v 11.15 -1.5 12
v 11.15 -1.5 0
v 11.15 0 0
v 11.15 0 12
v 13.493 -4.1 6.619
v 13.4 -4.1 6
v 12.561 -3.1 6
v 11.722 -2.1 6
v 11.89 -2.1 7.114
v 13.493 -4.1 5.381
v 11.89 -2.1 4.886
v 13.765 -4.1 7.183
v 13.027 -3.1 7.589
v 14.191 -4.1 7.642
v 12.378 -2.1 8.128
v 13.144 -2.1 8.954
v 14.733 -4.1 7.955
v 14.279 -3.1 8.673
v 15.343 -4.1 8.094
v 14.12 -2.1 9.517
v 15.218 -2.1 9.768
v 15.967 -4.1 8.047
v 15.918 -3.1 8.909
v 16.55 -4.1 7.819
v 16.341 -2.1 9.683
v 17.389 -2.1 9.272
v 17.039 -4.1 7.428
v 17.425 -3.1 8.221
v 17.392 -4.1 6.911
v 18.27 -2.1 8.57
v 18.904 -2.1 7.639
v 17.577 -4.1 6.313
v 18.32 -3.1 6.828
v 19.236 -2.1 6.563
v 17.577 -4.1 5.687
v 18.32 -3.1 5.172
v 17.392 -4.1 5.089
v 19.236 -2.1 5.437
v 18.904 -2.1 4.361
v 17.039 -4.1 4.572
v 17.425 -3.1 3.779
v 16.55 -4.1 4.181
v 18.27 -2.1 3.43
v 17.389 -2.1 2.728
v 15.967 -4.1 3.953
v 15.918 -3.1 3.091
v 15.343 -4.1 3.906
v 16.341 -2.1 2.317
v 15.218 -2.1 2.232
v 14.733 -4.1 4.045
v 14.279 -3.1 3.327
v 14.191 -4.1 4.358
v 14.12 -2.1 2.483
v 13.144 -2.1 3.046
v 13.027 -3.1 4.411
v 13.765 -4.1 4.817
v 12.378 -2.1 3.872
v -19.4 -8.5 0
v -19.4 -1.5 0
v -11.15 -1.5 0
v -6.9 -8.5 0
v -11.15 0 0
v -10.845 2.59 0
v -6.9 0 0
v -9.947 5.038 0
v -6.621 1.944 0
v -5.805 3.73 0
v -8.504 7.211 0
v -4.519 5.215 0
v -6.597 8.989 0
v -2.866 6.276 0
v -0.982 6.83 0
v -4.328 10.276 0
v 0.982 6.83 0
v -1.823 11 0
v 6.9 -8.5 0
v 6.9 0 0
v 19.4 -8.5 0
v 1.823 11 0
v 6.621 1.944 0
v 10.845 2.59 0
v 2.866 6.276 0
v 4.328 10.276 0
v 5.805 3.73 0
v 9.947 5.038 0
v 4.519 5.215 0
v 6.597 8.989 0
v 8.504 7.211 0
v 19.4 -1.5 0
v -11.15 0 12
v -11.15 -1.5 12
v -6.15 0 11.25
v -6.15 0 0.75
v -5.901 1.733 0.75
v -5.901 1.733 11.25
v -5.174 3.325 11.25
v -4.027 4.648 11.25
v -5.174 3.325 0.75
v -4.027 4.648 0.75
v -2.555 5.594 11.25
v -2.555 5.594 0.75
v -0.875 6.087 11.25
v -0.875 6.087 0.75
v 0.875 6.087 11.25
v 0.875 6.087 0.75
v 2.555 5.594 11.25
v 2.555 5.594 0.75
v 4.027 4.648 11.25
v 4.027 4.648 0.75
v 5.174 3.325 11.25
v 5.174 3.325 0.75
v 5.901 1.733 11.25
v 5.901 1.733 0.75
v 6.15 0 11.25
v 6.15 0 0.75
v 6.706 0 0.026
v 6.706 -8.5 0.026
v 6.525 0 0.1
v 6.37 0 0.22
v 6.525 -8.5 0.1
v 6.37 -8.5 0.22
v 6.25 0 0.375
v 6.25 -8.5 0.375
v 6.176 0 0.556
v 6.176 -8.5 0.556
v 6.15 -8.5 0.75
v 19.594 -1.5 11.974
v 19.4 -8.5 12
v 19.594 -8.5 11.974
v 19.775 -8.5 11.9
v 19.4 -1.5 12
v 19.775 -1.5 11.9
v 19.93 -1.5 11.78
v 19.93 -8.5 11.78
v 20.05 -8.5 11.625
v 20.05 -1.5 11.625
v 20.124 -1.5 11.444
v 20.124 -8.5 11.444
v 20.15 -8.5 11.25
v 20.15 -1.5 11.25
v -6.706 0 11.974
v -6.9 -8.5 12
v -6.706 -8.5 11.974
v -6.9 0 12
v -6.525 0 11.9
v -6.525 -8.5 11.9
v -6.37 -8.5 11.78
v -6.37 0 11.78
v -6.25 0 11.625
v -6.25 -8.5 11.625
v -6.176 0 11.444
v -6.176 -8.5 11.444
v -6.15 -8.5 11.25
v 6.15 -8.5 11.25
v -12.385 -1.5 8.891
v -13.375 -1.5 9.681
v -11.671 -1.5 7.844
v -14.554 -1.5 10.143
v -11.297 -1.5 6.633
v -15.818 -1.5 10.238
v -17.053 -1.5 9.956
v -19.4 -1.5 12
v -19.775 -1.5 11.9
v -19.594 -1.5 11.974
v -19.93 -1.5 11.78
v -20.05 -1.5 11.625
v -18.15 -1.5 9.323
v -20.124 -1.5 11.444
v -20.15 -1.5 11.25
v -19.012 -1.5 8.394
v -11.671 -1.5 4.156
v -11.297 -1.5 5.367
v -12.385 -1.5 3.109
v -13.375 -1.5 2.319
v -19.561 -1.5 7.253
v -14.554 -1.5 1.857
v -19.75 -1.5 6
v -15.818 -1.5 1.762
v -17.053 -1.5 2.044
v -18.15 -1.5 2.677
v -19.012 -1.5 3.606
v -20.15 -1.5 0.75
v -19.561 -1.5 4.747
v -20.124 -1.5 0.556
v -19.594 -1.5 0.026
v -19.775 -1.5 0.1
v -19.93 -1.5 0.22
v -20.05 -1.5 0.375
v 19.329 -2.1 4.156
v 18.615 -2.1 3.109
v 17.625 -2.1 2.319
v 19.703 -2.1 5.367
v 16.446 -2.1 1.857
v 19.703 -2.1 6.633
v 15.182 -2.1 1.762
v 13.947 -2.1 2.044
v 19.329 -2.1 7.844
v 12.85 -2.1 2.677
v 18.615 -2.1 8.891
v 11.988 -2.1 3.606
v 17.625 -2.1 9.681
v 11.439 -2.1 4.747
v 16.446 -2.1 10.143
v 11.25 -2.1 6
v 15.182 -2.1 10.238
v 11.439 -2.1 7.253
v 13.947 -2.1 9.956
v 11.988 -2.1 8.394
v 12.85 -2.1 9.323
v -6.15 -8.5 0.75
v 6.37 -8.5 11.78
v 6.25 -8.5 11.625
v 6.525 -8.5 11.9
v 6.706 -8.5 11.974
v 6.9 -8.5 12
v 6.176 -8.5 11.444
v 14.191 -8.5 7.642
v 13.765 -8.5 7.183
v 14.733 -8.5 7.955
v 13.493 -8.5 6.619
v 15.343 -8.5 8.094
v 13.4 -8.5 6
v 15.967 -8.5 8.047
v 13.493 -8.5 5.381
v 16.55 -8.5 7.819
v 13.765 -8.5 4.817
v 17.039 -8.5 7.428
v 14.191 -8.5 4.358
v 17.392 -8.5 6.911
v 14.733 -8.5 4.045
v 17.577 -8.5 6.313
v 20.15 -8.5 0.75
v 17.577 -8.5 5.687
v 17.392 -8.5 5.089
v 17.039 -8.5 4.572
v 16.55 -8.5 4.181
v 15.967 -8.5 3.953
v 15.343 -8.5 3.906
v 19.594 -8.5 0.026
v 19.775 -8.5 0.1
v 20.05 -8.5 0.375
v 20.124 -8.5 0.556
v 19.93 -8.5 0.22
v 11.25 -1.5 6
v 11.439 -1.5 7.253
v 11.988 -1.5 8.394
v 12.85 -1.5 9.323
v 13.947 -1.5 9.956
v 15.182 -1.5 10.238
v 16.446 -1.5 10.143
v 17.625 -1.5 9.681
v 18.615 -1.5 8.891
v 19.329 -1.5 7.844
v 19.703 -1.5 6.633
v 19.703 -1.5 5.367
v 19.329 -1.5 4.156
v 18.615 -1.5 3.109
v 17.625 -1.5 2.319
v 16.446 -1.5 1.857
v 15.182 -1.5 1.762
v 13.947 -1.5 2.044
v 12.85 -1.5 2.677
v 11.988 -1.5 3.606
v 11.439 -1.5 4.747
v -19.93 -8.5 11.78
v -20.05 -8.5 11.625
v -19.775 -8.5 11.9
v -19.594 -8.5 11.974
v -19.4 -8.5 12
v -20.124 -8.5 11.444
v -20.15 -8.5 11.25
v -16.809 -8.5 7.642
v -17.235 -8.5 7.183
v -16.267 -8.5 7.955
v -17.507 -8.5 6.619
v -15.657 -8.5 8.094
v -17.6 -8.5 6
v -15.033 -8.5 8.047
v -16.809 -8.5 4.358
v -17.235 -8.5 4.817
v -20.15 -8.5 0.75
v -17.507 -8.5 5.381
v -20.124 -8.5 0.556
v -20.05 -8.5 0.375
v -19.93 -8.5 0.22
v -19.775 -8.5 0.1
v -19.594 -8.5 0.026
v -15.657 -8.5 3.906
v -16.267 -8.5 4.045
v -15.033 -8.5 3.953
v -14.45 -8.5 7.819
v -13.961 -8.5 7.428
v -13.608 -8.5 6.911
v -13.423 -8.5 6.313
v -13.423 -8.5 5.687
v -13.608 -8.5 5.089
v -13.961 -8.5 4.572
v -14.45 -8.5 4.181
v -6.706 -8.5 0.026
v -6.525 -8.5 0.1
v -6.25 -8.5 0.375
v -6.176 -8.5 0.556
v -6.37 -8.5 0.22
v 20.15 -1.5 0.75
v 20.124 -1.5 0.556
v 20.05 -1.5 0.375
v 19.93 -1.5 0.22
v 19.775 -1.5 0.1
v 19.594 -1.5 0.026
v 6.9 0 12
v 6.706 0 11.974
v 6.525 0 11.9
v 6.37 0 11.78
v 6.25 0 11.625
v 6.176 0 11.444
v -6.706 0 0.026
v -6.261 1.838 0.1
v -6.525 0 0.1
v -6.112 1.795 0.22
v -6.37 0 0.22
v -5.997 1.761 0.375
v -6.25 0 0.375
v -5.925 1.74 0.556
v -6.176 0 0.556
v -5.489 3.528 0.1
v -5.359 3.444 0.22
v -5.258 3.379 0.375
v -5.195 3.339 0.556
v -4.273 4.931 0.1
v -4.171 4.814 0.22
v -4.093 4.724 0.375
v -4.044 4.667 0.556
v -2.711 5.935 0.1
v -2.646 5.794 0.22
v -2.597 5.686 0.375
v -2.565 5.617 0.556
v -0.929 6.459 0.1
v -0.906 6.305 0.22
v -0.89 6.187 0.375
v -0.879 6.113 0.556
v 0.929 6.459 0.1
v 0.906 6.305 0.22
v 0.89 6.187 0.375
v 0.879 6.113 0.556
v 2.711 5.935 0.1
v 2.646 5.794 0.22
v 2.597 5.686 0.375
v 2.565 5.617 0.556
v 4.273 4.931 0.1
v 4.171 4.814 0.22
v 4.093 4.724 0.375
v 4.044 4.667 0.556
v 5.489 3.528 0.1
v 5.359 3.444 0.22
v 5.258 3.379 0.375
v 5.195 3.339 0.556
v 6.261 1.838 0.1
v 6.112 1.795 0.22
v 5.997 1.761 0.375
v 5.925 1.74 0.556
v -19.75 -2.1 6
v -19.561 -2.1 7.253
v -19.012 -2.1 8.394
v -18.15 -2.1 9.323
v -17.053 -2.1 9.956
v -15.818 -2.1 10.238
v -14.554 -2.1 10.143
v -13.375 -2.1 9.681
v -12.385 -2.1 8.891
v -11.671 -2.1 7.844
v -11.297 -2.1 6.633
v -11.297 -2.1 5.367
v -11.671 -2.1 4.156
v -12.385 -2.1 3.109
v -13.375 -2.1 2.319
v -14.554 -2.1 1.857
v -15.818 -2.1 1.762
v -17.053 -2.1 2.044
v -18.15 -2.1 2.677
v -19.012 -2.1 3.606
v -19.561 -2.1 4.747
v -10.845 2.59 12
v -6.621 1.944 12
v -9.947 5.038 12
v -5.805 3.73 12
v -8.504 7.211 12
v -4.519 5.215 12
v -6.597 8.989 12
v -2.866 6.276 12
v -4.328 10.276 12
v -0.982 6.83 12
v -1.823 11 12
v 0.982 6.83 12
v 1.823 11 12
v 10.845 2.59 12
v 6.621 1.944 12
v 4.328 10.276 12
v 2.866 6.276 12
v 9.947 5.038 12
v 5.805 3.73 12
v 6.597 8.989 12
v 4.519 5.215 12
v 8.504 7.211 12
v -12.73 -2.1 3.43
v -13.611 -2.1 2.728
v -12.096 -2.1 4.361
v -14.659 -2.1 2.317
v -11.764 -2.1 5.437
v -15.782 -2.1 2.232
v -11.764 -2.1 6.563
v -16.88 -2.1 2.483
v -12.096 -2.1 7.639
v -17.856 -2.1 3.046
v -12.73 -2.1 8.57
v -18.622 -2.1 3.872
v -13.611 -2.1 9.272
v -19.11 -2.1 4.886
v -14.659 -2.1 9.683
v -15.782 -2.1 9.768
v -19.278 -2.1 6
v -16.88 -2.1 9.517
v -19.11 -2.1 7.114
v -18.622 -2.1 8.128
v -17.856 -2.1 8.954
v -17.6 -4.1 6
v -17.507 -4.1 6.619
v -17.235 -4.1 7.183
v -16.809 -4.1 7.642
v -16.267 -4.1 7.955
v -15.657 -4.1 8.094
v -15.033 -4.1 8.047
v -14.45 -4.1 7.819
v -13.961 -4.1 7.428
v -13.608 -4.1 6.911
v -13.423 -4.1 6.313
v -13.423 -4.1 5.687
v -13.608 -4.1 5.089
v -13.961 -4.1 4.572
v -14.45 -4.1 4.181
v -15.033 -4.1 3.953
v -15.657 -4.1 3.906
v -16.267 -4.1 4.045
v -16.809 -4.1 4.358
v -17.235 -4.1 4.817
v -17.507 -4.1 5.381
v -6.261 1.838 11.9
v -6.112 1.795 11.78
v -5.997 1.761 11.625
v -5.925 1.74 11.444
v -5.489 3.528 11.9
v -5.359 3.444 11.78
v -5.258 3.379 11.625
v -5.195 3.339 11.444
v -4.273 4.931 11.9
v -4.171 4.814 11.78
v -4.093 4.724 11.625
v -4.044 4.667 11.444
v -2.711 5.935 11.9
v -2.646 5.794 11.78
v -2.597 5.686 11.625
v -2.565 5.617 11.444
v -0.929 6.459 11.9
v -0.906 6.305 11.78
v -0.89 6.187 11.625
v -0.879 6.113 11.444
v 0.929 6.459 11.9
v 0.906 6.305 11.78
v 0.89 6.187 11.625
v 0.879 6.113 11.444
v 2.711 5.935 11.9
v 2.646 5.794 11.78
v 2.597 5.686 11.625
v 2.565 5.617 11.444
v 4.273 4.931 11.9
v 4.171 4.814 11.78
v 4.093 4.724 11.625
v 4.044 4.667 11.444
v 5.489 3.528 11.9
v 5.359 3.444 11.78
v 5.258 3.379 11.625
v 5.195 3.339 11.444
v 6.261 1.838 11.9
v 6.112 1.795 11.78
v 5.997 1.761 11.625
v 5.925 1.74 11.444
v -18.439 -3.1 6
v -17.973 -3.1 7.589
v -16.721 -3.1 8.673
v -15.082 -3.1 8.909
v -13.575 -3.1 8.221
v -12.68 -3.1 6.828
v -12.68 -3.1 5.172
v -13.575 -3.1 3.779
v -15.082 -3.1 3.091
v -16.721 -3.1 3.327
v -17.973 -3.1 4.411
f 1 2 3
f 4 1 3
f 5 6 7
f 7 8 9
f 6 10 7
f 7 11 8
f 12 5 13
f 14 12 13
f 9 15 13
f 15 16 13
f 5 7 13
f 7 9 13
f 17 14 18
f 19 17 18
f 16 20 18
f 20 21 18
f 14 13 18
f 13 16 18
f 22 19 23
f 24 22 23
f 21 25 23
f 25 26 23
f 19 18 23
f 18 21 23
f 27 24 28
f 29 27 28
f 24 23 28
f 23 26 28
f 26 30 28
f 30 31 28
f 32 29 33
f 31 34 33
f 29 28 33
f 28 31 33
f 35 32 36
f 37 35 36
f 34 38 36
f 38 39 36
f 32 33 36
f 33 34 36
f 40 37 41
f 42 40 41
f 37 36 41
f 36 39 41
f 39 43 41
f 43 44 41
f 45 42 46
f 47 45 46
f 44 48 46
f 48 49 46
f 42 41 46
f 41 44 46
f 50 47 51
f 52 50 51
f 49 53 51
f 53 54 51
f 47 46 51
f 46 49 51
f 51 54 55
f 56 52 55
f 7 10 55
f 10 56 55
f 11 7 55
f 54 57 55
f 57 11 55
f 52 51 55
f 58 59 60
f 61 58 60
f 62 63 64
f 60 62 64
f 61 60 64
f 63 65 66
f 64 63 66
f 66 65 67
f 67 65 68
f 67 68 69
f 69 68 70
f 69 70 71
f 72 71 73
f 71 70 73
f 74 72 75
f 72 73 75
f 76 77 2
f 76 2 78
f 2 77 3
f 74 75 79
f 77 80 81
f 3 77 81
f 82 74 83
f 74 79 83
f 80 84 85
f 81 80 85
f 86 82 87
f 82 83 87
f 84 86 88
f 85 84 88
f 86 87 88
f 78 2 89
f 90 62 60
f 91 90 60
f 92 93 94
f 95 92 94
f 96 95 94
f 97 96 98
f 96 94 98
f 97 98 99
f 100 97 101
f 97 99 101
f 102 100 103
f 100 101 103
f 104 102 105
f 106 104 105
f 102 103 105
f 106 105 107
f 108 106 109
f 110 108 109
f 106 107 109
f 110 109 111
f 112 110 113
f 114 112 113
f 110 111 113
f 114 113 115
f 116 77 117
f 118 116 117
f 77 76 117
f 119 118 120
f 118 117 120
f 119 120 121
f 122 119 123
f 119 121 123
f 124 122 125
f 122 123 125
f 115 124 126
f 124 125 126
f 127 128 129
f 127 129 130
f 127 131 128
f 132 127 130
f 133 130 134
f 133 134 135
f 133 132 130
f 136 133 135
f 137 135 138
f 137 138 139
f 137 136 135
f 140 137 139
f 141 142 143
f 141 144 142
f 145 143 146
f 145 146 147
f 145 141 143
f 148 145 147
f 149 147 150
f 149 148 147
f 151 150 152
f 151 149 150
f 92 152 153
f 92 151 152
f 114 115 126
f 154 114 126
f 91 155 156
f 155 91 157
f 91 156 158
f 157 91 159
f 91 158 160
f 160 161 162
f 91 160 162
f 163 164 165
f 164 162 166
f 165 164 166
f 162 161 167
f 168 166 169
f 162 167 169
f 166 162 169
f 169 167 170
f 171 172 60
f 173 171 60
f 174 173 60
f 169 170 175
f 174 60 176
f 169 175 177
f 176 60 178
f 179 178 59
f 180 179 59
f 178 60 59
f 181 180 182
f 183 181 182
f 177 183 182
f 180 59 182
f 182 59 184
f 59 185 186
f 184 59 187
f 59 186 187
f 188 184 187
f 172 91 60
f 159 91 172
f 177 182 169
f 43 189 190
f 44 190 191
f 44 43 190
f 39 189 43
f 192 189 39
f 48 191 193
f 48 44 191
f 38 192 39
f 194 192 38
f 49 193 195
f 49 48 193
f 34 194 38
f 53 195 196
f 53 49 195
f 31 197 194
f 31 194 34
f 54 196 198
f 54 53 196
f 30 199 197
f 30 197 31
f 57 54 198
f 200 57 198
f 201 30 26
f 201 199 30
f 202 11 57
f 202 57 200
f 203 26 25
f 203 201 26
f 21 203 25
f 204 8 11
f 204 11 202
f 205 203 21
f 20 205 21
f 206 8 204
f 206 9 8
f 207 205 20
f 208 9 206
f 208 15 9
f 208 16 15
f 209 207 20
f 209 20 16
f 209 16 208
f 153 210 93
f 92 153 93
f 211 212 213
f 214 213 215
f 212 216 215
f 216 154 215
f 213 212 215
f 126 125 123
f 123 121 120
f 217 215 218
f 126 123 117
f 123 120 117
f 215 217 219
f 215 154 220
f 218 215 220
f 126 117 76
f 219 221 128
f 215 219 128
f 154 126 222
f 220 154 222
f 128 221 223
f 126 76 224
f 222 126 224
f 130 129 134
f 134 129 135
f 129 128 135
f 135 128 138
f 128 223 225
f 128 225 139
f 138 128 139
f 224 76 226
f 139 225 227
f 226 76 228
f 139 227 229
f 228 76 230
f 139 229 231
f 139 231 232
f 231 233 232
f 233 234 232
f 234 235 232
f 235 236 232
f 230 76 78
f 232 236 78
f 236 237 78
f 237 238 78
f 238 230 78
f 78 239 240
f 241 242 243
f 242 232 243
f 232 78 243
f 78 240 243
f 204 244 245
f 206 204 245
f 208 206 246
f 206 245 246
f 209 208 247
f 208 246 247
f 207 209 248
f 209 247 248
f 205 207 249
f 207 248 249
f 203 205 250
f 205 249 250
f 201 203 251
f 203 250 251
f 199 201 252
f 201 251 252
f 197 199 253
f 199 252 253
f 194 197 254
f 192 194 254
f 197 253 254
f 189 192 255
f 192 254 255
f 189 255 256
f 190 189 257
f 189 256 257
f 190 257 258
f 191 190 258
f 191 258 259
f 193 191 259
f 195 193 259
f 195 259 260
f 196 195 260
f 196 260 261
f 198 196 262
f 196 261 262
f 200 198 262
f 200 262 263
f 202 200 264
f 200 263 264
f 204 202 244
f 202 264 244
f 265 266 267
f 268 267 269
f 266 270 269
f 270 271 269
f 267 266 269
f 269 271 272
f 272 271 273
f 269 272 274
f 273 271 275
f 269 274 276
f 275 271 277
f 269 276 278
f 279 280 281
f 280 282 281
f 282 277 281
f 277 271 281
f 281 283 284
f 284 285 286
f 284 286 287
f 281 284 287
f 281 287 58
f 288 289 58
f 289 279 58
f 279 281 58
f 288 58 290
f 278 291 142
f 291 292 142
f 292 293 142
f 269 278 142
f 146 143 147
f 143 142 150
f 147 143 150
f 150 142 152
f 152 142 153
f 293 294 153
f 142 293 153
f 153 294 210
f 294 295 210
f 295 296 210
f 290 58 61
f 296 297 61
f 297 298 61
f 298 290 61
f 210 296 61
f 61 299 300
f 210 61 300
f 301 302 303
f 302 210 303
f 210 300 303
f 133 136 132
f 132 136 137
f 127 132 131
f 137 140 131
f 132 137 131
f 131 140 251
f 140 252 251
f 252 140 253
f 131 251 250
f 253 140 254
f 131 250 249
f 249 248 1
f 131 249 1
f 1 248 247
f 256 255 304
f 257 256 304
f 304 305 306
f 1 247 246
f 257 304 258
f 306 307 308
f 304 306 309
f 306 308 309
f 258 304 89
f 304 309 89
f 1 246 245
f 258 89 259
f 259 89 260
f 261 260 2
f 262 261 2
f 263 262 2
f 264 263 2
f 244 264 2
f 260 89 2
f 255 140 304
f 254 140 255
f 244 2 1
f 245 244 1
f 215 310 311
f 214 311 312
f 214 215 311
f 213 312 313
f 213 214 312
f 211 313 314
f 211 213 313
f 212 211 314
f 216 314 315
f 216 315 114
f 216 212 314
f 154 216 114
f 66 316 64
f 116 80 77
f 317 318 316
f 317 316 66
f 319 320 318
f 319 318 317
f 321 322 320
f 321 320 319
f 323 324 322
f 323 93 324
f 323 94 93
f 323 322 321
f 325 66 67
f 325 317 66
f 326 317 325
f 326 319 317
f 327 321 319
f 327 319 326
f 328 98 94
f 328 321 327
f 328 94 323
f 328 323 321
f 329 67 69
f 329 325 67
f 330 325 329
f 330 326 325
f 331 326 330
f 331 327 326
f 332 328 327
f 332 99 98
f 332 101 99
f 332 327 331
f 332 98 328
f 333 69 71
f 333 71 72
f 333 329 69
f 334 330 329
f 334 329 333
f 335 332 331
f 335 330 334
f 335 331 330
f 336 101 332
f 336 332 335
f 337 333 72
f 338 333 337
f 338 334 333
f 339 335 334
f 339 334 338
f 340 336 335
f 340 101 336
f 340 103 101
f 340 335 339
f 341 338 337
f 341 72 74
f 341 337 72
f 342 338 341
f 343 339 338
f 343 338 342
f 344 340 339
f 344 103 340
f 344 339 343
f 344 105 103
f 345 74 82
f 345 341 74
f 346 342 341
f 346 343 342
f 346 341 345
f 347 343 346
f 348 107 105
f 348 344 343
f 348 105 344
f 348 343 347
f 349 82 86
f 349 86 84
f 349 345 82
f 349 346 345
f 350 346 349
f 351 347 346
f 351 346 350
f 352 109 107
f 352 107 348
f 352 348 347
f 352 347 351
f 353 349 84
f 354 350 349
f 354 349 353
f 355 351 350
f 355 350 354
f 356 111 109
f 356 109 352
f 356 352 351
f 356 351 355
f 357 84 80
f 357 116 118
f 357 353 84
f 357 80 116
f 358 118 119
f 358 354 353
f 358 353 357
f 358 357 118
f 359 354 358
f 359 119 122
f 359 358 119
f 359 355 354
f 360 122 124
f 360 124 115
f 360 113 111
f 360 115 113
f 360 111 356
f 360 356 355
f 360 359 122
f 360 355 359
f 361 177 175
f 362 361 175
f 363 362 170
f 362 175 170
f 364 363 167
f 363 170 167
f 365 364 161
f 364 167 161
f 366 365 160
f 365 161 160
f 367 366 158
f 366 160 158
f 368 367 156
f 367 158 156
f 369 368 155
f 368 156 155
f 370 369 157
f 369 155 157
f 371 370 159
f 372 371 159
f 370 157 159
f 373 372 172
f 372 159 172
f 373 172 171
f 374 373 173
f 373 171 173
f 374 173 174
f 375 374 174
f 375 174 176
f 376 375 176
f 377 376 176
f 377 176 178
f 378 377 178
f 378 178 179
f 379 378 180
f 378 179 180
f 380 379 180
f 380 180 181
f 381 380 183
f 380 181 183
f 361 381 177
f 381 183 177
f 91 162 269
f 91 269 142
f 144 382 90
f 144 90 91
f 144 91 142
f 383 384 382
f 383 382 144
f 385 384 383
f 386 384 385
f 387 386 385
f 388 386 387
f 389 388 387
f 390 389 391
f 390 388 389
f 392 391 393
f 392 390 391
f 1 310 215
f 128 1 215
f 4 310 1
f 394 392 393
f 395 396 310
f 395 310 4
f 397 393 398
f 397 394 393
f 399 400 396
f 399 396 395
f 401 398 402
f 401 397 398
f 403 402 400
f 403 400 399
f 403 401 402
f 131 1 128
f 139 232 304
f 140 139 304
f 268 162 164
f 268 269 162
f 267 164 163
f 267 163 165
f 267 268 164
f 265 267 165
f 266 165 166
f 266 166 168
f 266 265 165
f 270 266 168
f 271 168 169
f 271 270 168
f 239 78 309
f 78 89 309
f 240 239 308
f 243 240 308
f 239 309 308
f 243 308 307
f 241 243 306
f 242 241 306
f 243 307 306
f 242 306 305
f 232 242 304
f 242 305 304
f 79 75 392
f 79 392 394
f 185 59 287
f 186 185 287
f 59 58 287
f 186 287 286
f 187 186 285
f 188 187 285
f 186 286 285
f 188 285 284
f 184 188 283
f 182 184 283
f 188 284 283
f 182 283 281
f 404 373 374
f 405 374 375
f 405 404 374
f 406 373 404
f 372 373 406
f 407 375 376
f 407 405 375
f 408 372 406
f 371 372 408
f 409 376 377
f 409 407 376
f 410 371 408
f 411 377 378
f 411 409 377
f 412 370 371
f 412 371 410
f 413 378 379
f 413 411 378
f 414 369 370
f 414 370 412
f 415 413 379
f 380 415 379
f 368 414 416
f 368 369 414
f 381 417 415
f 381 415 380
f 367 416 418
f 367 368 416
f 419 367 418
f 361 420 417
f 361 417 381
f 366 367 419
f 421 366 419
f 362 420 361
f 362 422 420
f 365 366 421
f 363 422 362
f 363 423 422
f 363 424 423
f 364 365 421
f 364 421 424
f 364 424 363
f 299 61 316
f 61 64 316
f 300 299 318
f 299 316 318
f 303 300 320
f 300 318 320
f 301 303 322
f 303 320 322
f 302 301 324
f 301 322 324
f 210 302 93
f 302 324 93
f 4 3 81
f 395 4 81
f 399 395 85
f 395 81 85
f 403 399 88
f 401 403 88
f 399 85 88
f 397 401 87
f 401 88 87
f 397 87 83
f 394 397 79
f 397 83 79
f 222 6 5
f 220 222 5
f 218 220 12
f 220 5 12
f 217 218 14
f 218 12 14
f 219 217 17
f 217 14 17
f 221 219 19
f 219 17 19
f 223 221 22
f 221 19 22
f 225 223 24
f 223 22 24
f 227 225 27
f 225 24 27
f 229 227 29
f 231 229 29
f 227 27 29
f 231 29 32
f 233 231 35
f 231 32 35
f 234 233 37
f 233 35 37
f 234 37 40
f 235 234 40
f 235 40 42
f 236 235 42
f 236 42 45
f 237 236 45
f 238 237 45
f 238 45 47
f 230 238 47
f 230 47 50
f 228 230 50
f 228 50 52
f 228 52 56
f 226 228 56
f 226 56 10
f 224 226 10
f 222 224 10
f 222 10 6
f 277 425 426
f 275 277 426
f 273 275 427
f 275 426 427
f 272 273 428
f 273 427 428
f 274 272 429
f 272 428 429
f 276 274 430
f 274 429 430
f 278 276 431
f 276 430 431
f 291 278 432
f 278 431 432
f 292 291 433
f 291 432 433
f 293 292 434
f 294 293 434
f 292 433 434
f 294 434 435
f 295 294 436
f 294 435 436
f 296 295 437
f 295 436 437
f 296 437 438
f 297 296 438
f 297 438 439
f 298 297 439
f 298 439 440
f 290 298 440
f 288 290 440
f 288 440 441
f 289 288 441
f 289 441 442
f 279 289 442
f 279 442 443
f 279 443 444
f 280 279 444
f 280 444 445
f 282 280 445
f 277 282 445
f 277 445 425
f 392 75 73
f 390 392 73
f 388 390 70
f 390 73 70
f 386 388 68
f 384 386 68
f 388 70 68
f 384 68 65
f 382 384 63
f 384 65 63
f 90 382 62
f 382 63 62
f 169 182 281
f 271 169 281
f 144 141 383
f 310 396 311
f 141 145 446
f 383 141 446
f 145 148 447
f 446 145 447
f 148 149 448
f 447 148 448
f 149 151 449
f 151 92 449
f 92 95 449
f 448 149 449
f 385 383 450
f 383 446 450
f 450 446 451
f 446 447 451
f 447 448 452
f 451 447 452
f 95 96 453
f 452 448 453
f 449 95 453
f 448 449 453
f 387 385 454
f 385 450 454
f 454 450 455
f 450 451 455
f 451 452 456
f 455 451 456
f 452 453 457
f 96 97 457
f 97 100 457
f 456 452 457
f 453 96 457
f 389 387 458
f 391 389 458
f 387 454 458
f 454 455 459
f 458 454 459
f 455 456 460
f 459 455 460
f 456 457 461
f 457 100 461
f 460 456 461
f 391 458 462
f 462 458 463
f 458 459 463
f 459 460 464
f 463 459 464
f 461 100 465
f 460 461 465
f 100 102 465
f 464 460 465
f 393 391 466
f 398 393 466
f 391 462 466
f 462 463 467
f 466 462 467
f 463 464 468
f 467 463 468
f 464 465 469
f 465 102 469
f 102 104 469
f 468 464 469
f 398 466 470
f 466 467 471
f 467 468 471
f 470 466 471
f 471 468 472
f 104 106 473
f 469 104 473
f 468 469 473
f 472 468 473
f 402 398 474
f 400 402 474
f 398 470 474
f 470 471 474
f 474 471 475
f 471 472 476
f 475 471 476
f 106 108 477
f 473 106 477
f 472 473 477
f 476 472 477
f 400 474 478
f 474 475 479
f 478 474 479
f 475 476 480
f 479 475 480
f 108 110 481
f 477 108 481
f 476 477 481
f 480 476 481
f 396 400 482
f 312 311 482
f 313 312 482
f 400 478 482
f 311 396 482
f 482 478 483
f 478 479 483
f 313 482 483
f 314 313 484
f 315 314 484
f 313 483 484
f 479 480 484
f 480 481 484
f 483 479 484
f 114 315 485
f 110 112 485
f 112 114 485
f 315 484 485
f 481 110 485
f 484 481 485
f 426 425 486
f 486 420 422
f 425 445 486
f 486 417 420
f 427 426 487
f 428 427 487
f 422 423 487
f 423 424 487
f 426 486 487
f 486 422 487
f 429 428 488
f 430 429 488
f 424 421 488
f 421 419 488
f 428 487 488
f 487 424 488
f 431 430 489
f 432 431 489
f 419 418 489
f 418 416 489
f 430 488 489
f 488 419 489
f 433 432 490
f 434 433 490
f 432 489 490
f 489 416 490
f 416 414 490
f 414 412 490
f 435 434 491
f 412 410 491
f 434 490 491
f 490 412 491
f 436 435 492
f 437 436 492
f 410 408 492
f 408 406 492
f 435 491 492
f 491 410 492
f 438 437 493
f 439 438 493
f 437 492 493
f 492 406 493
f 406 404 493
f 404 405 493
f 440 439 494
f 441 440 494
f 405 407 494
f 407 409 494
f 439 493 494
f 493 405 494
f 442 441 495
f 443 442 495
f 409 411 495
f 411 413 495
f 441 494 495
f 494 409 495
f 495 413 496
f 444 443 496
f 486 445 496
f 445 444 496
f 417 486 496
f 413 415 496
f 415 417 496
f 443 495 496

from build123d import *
from OCP.BRepFilletAPI import BRepFilletAPI_MakeChamfer

# Parameters (mm, degrees)
BOSS_EXTRUDE1_DEPTH = 12
SKETCH4_R           = 2.1
CUT_EXTRUDE1_DEPTH  = 27.646669586
SKETCH5_W           = 17.126081539
SKETCH5_H           = 14.483771816
CUT_EXTRUDE2_DEPTH  = 31.50036885
FILLET2_R           = 0.75
SKETCH7_R           = 4.25
CUT_EXTRUDE4_DEPTH  = 0.6
CHAMFER1_SIZE       = 2
CHAMFER1_SIZE2      = 1.678199262


with BuildPart() as part:
    # Sketch1 → Boss-Extrude1 (new body)
    with BuildSketch(Plane.XY):
        with BuildLine():
            Line((-11.15, 0), (-11.15, -1.5))
            Line((-11.15, -1.5), (-20.15, -1.5))
            Line((-20.15, -1.5), (-20.15, -8.5))
            Line((-20.15, -8.5), (-6.15, -8.5))
            Line((-6.15, -8.5), (-6.15, 0))
            ThreePointArc((-6.15, 0), (0, 6.15), (6.15, 0))
            Line((6.15, 0), (6.15, -8.5))
            Line((6.15, -8.5), (20.15, -8.5))
            Line((20.15, -8.5), (20.15, -1.5))
            Line((20.15, -1.5), (11.15, -1.5))
            Line((11.15, -1.5), (11.15, 0))
            ThreePointArc((11.15, 0), (0, 11.15), (-11.15, 0))
        make_face()
    extrude(amount=BOSS_EXTRUDE1_DEPTH)

    # Sketch4 → Cut-Extrude1 (cut, through all)
    with BuildSketch(Plane(origin=(0, -1.5, 0), x_dir=(1, 0, 0), z_dir=(0, 1, 0))):
        with Locations(Location((-15.5, -6, 0), (0, 0, 180))):
            Circle(SKETCH4_R)
        with Locations(Location((15.5, -6, 0), (0, 0, 180))):
            Circle(SKETCH4_R)
    extrude(amount=-CUT_EXTRUDE1_DEPTH, mode=Mode.SUBTRACT)

    # Sketch5 → Cut-Extrude2 (cut, through all)
    with BuildSketch(Plane(origin=(0, 11, 0), x_dir=(1, 0, 0), z_dir=(0, 1, 0))):
        with Locations((0.195726647, -5.794276843)):
            Rectangle(SKETCH5_W, SKETCH5_H)
    extrude(amount=CUT_EXTRUDE2_DEPTH, mode=Mode.SUBTRACT)

    # Fillet2
    fillet2_edges = [part.edges().sort_by_distance(p)[0] for p in [
        (20.15, -5, 0),
        (6.15, -4.25, 0),
        (0, 6.15, 0),
        (-6.15, -4.25, 0),
        (-20.15, -5, 0),
        (-20.15, -5, 12),
        (-6.15, -4.25, 12),
        (0, 6.15, 12),
        (6.15, -4.25, 12),
        (20.15, -5, 12),
    ]]
    fillet(fillet2_edges, radius=FILLET2_R)

    # Sketch7 → Cut-Extrude4 (cut)
    with BuildSketch(Plane(origin=(0, -1.5, 0), x_dir=(1, 0, 0), z_dir=(0, 1, 0))):
        with Locations(Location((-15.5, -6, 0), (0, 0, 180))):
            Circle(SKETCH7_R)
        with Locations(Location((15.5, -6, 0), (0, 0, 180))):
            Circle(SKETCH7_R)
    extrude(amount=-CUT_EXTRUDE4_DEPTH, mode=Mode.SUBTRACT)

    # Chamfer1: one chamfer whose edges measure the first distance from different faces: ONE call of the kernel's chamfer builder (chamfer() names one face for all edges)
    chamfer1_edges_1 = [part.edges().sort_by_distance(p)[0] for p in [
        (-13.4, -2.1, 6),
    ]]
    chamfer1_side_1 = [part.faces().sort_by_distance(p)[0] for p in [
        (-13.4, -5.3, 6),
    ]]
    chamfer1_edges_2 = [part.edges().sort_by_distance(p)[0] for p in [
        (17.6, -2.1, 6),
    ]]
    chamfer1_side_2 = [part.faces().sort_by_distance(p)[0] for p in [
        (17.6, -5.3, 6),
    ]]
    chamfer1 = BRepFilletAPI_MakeChamfer(part.part.solid().wrapped)
    for e in chamfer1_edges_1:
        chamfer1.Add(CHAMFER1_SIZE, CHAMFER1_SIZE2, e.wrapped, chamfer1_side_1[0].wrapped)  # the first distance lies on this face
    for e in chamfer1_edges_2:
        chamfer1.Add(CHAMFER1_SIZE, CHAMFER1_SIZE2, e.wrapped, chamfer1_side_2[0].wrapped)  # the first distance lies on this face
    add(Compound.cast(chamfer1.Shape()), mode=Mode.REPLACE)


solid = part.part
